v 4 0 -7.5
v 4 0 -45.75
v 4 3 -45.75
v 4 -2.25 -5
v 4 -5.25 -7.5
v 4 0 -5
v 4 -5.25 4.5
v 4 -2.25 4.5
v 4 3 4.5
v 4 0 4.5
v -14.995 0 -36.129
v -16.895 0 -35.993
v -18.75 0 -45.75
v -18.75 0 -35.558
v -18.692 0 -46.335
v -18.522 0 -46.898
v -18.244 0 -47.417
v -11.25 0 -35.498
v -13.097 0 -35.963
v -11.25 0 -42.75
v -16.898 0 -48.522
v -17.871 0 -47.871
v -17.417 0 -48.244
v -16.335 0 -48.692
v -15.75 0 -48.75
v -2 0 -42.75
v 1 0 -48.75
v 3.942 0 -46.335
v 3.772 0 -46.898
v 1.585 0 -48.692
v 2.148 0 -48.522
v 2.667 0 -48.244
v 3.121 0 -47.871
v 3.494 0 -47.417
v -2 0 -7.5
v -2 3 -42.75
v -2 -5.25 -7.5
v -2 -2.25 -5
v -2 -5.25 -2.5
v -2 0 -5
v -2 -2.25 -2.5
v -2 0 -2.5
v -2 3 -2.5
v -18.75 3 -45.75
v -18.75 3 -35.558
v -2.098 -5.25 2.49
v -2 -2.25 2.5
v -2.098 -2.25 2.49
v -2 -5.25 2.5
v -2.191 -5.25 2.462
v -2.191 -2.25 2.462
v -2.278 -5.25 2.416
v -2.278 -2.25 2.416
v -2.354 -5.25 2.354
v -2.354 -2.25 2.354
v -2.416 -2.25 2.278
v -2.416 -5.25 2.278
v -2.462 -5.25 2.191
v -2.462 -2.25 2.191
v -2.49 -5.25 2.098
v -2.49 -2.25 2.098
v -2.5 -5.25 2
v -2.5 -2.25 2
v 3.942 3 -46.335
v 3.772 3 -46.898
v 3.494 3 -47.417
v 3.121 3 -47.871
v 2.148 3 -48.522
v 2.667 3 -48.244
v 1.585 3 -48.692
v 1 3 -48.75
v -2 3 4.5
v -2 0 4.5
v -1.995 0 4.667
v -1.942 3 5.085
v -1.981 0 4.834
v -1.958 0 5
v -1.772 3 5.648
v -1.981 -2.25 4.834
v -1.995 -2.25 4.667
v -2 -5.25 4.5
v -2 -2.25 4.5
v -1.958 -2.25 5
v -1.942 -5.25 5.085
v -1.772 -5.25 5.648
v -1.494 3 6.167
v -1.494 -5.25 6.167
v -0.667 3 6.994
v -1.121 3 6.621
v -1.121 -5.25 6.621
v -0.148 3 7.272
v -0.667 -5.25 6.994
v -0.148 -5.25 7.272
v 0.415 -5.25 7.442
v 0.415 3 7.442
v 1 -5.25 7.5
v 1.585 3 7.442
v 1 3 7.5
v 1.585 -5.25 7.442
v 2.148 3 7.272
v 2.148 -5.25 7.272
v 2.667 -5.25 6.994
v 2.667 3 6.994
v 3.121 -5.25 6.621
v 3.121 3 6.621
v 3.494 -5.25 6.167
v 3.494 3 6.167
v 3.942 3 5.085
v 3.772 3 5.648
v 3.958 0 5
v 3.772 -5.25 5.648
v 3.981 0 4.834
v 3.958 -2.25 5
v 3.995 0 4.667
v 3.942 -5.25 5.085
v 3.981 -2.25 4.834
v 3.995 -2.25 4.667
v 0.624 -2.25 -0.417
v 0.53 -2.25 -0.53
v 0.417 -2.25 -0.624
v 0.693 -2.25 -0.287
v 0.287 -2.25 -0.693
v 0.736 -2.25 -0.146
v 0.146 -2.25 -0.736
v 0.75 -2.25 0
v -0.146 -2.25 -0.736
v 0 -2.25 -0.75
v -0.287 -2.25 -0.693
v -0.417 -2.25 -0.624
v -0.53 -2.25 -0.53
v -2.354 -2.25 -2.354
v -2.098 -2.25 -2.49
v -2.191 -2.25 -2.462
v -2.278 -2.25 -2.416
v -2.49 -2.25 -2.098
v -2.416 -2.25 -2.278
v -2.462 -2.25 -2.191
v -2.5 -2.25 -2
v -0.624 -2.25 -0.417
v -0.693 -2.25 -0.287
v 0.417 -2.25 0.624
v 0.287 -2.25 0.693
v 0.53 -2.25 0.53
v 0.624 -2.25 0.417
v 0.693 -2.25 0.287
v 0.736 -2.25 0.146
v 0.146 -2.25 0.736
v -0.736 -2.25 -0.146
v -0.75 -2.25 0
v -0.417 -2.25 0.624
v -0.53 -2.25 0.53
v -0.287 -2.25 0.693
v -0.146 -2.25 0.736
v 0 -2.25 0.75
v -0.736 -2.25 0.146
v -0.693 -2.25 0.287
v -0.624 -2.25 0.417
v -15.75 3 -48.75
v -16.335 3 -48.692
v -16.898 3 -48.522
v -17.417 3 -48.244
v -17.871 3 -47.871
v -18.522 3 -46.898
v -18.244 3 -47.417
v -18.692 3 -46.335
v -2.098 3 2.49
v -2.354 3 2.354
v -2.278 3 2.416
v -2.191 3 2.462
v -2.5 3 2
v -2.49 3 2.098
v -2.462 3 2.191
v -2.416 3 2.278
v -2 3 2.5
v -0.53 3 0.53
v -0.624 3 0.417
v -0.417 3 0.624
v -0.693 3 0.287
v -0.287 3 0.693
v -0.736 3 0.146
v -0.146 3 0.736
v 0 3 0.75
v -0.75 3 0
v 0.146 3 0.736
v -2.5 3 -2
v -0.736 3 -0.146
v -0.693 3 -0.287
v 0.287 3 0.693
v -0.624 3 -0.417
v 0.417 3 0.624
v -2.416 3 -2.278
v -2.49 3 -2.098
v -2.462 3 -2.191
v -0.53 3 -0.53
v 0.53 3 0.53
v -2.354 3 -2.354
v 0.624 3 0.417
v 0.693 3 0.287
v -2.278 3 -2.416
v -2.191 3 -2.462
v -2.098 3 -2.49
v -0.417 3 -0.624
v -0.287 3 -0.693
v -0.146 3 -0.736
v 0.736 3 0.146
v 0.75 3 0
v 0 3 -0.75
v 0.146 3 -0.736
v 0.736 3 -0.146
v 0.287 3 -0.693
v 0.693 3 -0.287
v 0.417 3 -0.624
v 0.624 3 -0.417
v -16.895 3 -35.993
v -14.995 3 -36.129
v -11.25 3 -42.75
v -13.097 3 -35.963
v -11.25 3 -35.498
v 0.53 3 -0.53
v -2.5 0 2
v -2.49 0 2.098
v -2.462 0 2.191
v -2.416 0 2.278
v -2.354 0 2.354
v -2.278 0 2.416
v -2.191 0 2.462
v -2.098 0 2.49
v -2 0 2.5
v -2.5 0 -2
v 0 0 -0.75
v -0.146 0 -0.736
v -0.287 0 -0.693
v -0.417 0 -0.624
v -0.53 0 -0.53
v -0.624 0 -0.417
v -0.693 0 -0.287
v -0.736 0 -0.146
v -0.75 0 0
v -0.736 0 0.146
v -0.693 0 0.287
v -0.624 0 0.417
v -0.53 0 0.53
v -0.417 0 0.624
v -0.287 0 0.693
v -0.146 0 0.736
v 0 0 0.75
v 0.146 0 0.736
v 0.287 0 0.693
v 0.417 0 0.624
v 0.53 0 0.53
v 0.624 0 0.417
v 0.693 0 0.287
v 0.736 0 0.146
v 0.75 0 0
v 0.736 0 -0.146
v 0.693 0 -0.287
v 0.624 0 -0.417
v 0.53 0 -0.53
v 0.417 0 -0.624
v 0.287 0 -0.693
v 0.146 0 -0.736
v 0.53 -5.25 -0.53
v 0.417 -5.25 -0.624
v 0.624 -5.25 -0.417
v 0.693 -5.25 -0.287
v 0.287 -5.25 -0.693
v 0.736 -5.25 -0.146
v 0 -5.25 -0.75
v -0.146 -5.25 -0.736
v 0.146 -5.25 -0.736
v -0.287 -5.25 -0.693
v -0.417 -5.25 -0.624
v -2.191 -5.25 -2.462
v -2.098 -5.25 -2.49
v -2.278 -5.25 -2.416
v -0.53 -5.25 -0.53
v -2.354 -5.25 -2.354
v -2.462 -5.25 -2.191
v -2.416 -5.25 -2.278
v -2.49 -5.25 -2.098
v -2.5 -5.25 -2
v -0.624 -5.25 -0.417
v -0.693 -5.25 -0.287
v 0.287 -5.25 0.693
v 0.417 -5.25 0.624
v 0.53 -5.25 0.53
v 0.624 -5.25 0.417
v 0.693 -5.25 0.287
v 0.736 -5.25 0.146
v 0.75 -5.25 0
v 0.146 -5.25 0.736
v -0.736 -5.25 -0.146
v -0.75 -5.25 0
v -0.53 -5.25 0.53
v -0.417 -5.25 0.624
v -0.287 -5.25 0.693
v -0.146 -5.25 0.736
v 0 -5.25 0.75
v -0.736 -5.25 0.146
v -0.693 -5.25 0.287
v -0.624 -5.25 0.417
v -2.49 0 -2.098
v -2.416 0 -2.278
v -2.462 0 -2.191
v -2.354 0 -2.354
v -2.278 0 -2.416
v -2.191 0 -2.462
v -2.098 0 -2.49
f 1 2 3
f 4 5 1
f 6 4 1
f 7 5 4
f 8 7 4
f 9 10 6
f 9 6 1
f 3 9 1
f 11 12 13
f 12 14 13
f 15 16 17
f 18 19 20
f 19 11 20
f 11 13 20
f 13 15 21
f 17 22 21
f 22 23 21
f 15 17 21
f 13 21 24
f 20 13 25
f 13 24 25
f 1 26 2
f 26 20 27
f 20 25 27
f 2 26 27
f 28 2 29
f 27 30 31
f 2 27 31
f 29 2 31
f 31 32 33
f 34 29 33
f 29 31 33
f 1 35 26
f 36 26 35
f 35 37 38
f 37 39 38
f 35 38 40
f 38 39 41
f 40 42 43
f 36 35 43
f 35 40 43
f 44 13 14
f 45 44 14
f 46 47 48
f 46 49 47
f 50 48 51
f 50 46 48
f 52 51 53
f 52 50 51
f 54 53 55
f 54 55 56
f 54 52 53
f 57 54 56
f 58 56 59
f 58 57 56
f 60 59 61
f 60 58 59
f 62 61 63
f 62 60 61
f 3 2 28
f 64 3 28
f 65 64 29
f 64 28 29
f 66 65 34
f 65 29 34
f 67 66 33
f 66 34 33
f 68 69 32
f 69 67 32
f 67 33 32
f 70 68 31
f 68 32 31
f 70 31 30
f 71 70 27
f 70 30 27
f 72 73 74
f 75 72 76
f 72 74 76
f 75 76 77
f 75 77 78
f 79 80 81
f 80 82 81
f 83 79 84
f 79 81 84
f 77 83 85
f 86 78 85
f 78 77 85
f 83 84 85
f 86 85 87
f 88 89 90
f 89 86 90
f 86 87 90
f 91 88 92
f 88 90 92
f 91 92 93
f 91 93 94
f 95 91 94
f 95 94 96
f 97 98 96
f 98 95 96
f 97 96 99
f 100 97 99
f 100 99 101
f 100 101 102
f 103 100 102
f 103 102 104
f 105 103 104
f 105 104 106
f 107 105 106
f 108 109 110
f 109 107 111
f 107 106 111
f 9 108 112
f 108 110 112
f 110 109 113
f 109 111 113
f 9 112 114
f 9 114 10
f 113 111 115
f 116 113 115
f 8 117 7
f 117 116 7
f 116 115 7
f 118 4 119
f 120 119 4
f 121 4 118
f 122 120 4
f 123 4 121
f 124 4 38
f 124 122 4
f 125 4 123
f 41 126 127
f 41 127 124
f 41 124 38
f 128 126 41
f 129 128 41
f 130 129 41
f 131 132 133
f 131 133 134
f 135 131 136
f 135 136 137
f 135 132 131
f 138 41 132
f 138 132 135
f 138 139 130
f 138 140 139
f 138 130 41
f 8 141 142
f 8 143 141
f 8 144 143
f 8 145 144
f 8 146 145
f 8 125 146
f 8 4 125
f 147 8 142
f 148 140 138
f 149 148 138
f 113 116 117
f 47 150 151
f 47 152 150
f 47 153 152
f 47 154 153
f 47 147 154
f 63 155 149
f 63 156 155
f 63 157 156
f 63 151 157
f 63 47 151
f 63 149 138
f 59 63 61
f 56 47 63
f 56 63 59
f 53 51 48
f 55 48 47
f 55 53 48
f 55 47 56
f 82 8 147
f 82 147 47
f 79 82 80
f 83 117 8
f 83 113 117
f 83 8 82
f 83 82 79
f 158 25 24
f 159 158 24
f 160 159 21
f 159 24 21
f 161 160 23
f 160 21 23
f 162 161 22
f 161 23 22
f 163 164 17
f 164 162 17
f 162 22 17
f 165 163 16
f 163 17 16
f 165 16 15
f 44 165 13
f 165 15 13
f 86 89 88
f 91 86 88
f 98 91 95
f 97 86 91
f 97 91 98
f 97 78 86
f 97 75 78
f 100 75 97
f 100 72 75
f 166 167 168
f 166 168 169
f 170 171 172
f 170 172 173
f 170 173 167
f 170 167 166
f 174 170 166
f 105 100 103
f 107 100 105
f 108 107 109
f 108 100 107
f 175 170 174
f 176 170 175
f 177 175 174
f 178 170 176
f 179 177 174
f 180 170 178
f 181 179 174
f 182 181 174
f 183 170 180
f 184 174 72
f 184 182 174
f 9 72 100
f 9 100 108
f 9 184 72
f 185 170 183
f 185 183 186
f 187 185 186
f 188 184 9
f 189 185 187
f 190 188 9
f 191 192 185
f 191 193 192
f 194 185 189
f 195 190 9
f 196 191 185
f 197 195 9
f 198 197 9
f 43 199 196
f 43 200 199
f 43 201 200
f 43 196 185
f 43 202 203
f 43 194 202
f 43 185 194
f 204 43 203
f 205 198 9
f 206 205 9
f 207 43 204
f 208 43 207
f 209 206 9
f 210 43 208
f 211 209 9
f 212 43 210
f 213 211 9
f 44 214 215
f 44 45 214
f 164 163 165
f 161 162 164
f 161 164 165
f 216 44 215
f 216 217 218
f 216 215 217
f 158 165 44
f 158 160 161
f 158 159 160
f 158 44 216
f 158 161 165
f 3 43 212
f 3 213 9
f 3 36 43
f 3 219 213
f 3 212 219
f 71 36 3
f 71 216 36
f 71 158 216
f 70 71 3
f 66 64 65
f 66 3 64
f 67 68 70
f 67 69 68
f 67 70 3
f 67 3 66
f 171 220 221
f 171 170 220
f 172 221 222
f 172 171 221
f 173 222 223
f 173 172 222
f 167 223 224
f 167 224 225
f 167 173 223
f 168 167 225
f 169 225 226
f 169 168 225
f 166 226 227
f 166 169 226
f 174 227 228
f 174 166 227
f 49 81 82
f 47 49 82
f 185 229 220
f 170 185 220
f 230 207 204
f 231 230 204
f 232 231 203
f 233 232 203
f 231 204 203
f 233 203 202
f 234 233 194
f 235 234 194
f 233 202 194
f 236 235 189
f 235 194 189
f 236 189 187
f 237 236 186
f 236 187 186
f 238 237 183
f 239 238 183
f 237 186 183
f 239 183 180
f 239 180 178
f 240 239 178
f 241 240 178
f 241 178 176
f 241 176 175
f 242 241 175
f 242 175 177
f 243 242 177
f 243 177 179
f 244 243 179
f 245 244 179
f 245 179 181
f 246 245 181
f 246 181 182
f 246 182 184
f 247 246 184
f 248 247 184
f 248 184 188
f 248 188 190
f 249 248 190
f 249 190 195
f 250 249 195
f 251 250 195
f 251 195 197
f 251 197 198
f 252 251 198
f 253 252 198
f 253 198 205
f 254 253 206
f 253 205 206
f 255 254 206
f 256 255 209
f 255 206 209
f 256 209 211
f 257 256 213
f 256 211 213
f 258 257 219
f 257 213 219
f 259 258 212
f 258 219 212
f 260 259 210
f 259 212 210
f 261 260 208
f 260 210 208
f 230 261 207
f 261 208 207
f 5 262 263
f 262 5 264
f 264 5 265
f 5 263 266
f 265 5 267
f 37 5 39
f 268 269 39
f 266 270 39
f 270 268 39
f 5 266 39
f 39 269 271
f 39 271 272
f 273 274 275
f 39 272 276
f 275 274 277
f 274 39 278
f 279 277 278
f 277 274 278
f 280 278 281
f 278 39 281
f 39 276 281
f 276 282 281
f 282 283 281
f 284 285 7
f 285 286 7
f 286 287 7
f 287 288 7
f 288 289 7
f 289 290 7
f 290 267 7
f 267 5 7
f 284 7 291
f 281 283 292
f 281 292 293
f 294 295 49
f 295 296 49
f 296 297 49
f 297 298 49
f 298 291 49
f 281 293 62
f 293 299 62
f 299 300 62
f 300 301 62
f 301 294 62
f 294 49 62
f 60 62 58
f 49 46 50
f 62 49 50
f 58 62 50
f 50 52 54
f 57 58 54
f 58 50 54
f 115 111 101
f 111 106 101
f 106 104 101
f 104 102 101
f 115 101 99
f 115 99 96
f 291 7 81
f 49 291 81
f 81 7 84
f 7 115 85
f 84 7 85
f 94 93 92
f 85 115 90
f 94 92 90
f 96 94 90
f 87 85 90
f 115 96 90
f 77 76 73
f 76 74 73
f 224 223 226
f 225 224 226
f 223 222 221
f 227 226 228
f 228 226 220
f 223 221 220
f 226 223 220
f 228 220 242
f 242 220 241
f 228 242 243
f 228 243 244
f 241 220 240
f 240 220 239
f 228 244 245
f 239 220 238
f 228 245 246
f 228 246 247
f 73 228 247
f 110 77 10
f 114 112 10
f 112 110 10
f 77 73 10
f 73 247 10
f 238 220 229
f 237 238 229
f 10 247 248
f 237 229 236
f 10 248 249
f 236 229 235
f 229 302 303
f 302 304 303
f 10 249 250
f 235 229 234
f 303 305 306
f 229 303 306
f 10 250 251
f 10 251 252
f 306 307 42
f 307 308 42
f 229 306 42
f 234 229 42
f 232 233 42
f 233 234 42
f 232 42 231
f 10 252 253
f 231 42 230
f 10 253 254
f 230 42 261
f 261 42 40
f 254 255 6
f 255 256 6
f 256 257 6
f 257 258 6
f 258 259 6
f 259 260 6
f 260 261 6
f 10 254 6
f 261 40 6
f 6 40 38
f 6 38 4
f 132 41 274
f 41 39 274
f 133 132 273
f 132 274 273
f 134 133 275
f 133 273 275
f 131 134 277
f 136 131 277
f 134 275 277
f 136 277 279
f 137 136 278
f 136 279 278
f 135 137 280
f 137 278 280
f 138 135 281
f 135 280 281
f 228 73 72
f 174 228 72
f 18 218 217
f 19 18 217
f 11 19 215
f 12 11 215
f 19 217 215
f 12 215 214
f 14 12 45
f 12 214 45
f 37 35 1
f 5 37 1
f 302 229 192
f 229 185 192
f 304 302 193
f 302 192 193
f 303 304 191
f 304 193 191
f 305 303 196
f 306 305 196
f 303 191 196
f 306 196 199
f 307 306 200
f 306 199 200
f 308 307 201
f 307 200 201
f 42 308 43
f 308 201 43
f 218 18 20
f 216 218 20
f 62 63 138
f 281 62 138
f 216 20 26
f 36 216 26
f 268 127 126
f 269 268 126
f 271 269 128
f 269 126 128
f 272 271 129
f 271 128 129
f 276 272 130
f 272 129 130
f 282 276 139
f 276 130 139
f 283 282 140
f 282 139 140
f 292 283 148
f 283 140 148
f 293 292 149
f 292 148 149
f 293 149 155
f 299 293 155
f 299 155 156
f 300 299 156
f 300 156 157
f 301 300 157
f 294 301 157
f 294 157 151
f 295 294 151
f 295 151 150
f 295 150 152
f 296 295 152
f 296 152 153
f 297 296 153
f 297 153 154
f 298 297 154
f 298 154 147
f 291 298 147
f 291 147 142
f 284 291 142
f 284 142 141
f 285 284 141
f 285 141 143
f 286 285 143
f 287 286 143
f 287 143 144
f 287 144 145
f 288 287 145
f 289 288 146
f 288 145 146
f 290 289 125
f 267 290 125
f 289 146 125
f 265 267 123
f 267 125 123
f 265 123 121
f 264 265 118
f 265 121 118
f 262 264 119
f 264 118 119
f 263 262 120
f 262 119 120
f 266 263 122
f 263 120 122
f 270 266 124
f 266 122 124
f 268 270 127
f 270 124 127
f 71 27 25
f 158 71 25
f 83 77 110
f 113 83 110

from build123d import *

# Parameters (mm, degrees)
BOSS_EXTRUDE1_DEPTH = 3
SKETCH2_R           = 12
CUT_EXTRUDE1_DEPTH  = 3
SKETCH5_W           = 6
SKETCH5_H           = 2.5
BOSS_EXTRUDE2_DEPTH = 5.25
SKETCH6_W           = 6
SKETCH6_H           = 3
BOSS_EXTRUDE3_DEPTH = 10
CUT_EXTRUDE2_REACH  = 54.879
SKETCH4_R           = 0.75
FILLET1_R           = 3
SKETCH8_W           = 0.5
SKETCH8_H           = 5
BOSS_EXTRUDE4_DEPTH = 3
FILLET2_R           = 0.5


# Some blends are built 0.0001 mm under size
with BuildPart() as part:
    # Sketch1 → Boss-Extrude1 (new body)
    with BuildSketch(Plane(origin=(0, 0, 0), x_dir=(1, 0, 0), z_dir=(0, 1, 0))):
        Polygon((-2, -7.5), (4, -7.5), (4, 48.75), (-18.75, 48.75), (-18.75, 28.369317262), (-11.25, 28.369317262), (-11.25, 42.75), (-2, 42.75), (-2, 2.5), (-2.5, 2.5), (-2.5, -2.5), (-2, -2.5), align=None)
    extrude(amount=BOSS_EXTRUDE1_DEPTH)

    # Sketch2 → Cut-Extrude1 (cut)
    with BuildSketch(Plane(origin=(0, 3, 0), x_dir=(1, 0, 0), z_dir=(0, 1, 0))):
        with Locations((-15.091915752, 24.129582051)):
            Circle(SKETCH2_R)
    extrude(amount=-CUT_EXTRUDE1_DEPTH, mode=Mode.SUBTRACT)

    # Sketch5 → Boss-Extrude2 (add)
    with BuildSketch(Plane.XZ):
        with Locations((1, -6.25)):
            Rectangle(SKETCH5_W, SKETCH5_H)
        with Locations((1, 6.25)):
            Rectangle(SKETCH5_W, SKETCH5_H)
    extrude(amount=BOSS_EXTRUDE2_DEPTH)

    # Sketch6 → Boss-Extrude3 (add)
    with BuildSketch(Plane(origin=(0, 0, 5), x_dir=(-1, 0, 0), z_dir=(0, 0, -1))):
        with Locations((-1, -3.75)):
            Rectangle(SKETCH6_W, SKETCH6_H)
    extrude(amount=BOSS_EXTRUDE3_DEPTH)

    # Cut-Extrude2: up to this face of the body (flat: up to its plane)
    cut_extrude2_end = Plane(part.part.faces().sort_by_distance((1, -5.25, 0))[0])
    # Sketch4 → Cut-Extrude2 (cut, up to the picked face)
    with BuildSketch(Plane(origin=(0, 3, 0), x_dir=(1, 0, 0), z_dir=(0, 1, 0)), mode=Mode.PRIVATE) as cut_extrude2_sk1:
        with Locations(Location((0, 0, 0), (0, 0, 90))):
            Circle(SKETCH4_R)
    cut_extrude2_tool1 = split(extrude(cut_extrude2_sk1.sketch, amount=-CUT_EXTRUDE2_REACH, mode=Mode.PRIVATE), bisect_by=cut_extrude2_end, keep=Keep.BOTH, mode=Mode.PRIVATE)
    add(cut_extrude2_tool1.solids().sort_by(Axis((0, 3, 0), (0, -1, 0)))[0], mode=Mode.SUBTRACT)

    # Fillet1
    # the kernel refuses this fillet: 3 mm, written as the material it takes off along each edge
    with BuildSketch(Plane(origin=(-18.75, -7.5, -48.75), x_dir=(1, 0, 0), z_dir=(0, 1, 0)), Plane(origin=(4, -7.5, -48.75), x_dir=(0, 0, 1), z_dir=(0, 1, 0))) as fillet1_piece_1:
        with BuildLine():
            CenterArc((FILLET1_R, -FILLET1_R), FILLET1_R, 90, 90)
            Line((0, -FILLET1_R), (0, 0))
            Line((0, 0), (FILLET1_R, 0))
        make_face()
    extrude(amount=18, mode=Mode.SUBTRACT)
    with BuildSketch(Plane(origin=(4, -12.75, 7.5), x_dir=(-1, 0, 0), z_dir=(0, 1, 0)), Plane(origin=(-2, -12.75, 7.5), x_dir=(0, 0, -1), z_dir=(0, 1, 0))) as fillet1_piece_2:
        with BuildLine():
            CenterArc((FILLET1_R, -FILLET1_R), FILLET1_R, 90, 90)
            Line((0, -FILLET1_R), (0, 0))
            Line((0, 0), (FILLET1_R, 0))
        make_face()
    extrude(amount=23.25, mode=Mode.SUBTRACT)

    # Sketch8 → Boss-Extrude4 (add)
    with BuildSketch(Plane(origin=(0, -2.25, 0), x_dir=(1, 0, 0), z_dir=(0, 1, 0))):
        with Locations((-2.25, 0)):
            Rectangle(SKETCH8_W, SKETCH8_H)
    extrude(amount=-BOSS_EXTRUDE4_DEPTH)

    # Fillet2
    fillet2_edges = [part.edges().sort_by_distance(p)[0] for p in [
        (-2.5, 1.5, 2.5),
        (-2.5, 1.5, -2.5),
        (-2.5, -3.75, 2.5),
        (-2.5, -3.75, -2.5),
    ]]
    fillet(fillet2_edges, radius=FILLET2_R - 0.0001)  # a hair under: the kernel refuses the full size


solid = part.part
